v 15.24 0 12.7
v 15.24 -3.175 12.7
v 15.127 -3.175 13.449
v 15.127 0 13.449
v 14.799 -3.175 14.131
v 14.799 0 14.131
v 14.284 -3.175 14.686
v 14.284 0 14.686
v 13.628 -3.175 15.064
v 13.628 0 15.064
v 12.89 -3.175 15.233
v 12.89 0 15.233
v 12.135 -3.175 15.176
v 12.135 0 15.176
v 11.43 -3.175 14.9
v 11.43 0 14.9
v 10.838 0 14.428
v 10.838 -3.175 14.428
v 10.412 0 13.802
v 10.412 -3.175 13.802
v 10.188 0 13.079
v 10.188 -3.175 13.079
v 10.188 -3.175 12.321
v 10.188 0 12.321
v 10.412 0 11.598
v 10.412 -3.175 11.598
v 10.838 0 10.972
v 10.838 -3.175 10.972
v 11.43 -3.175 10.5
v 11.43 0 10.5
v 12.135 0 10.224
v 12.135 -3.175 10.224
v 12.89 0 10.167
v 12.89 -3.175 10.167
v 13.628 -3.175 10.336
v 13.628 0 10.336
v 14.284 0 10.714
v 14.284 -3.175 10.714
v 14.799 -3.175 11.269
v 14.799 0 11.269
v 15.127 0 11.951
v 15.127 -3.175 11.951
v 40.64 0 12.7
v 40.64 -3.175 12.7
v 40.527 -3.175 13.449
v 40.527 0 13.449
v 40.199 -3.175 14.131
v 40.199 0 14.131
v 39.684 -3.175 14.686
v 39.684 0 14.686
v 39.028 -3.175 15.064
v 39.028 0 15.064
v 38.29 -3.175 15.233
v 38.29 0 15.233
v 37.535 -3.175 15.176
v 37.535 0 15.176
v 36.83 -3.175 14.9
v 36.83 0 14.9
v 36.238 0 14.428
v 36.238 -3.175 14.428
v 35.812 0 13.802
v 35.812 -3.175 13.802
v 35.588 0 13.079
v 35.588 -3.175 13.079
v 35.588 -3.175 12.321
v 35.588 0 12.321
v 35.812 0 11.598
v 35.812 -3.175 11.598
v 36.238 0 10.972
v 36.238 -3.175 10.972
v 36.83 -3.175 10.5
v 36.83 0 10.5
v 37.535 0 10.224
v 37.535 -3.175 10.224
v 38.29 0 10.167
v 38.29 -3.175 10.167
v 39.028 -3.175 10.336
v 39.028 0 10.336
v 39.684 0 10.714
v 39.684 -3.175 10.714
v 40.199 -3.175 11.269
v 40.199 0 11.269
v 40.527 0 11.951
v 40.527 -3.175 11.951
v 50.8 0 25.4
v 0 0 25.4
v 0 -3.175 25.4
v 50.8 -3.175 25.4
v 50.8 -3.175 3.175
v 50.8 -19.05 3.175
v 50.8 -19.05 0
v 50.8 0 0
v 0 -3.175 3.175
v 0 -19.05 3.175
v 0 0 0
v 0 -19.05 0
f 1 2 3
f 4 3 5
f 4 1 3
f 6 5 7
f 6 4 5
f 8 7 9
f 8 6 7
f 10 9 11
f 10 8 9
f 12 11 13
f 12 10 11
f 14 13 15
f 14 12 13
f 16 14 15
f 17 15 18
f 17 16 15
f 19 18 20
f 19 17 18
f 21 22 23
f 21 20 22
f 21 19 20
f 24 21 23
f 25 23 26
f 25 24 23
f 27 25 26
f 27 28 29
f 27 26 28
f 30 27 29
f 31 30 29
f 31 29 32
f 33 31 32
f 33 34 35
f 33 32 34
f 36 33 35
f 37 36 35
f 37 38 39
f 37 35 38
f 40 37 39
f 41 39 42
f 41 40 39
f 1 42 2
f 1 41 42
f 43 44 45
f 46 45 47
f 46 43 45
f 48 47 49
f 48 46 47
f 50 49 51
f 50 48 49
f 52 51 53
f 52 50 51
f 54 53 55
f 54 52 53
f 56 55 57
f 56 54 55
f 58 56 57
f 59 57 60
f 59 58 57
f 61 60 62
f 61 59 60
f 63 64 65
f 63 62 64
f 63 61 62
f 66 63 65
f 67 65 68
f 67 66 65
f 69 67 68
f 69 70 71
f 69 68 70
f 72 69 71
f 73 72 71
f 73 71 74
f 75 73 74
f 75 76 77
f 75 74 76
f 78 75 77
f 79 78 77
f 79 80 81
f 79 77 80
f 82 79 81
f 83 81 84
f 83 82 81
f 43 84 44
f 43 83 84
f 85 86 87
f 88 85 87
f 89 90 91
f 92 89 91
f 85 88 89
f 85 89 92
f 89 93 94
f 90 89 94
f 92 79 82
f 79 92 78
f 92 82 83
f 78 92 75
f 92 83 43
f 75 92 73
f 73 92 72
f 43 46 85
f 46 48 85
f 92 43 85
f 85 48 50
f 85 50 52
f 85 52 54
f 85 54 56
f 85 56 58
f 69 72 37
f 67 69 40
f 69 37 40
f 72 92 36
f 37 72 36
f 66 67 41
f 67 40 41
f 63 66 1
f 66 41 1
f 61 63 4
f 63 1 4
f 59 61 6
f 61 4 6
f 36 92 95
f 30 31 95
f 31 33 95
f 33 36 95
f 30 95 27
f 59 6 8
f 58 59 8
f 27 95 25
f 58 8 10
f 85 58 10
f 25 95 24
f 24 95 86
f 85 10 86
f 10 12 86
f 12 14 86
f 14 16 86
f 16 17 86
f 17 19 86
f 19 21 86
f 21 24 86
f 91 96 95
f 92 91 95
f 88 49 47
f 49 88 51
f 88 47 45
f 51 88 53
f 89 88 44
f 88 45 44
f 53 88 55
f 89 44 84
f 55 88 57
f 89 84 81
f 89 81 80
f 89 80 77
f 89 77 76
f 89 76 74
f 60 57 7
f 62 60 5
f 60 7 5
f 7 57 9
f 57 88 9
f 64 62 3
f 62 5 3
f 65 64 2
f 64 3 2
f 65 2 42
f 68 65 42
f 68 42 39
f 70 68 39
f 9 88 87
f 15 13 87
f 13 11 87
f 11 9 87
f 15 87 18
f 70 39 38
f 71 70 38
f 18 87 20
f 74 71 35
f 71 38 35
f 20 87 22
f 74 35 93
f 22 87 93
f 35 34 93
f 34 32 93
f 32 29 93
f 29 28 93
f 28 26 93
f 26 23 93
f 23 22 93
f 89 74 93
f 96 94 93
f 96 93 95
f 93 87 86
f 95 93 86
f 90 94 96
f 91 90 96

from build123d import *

# Parameters (mm, degrees)
F1_DEPTH = 50.8
F2_R     = 2.54
F3_DEPTH = 25.4


with BuildPart() as f1:
    # F0 (on Right) → F1 (new body)
    with BuildSketch(Plane.YZ):
        Polygon((-19.05, 0), (0, 0), (0, 25.4), (-3.175, 25.4), (-3.175, 3.175), (-19.05, 3.175), align=None)
    extrude(amount=F1_DEPTH)

    # F2 (on Front) → F3 (cut)
    with BuildSketch(Plane.XZ):
        with Locations((38.1, 12.7)):
            Circle(F2_R)
        with Locations((12.7, 12.7)):
            Circle(F2_R)
    extrude(amount=F3_DEPTH, mode=Mode.SUBTRACT)


solid = f1.part
